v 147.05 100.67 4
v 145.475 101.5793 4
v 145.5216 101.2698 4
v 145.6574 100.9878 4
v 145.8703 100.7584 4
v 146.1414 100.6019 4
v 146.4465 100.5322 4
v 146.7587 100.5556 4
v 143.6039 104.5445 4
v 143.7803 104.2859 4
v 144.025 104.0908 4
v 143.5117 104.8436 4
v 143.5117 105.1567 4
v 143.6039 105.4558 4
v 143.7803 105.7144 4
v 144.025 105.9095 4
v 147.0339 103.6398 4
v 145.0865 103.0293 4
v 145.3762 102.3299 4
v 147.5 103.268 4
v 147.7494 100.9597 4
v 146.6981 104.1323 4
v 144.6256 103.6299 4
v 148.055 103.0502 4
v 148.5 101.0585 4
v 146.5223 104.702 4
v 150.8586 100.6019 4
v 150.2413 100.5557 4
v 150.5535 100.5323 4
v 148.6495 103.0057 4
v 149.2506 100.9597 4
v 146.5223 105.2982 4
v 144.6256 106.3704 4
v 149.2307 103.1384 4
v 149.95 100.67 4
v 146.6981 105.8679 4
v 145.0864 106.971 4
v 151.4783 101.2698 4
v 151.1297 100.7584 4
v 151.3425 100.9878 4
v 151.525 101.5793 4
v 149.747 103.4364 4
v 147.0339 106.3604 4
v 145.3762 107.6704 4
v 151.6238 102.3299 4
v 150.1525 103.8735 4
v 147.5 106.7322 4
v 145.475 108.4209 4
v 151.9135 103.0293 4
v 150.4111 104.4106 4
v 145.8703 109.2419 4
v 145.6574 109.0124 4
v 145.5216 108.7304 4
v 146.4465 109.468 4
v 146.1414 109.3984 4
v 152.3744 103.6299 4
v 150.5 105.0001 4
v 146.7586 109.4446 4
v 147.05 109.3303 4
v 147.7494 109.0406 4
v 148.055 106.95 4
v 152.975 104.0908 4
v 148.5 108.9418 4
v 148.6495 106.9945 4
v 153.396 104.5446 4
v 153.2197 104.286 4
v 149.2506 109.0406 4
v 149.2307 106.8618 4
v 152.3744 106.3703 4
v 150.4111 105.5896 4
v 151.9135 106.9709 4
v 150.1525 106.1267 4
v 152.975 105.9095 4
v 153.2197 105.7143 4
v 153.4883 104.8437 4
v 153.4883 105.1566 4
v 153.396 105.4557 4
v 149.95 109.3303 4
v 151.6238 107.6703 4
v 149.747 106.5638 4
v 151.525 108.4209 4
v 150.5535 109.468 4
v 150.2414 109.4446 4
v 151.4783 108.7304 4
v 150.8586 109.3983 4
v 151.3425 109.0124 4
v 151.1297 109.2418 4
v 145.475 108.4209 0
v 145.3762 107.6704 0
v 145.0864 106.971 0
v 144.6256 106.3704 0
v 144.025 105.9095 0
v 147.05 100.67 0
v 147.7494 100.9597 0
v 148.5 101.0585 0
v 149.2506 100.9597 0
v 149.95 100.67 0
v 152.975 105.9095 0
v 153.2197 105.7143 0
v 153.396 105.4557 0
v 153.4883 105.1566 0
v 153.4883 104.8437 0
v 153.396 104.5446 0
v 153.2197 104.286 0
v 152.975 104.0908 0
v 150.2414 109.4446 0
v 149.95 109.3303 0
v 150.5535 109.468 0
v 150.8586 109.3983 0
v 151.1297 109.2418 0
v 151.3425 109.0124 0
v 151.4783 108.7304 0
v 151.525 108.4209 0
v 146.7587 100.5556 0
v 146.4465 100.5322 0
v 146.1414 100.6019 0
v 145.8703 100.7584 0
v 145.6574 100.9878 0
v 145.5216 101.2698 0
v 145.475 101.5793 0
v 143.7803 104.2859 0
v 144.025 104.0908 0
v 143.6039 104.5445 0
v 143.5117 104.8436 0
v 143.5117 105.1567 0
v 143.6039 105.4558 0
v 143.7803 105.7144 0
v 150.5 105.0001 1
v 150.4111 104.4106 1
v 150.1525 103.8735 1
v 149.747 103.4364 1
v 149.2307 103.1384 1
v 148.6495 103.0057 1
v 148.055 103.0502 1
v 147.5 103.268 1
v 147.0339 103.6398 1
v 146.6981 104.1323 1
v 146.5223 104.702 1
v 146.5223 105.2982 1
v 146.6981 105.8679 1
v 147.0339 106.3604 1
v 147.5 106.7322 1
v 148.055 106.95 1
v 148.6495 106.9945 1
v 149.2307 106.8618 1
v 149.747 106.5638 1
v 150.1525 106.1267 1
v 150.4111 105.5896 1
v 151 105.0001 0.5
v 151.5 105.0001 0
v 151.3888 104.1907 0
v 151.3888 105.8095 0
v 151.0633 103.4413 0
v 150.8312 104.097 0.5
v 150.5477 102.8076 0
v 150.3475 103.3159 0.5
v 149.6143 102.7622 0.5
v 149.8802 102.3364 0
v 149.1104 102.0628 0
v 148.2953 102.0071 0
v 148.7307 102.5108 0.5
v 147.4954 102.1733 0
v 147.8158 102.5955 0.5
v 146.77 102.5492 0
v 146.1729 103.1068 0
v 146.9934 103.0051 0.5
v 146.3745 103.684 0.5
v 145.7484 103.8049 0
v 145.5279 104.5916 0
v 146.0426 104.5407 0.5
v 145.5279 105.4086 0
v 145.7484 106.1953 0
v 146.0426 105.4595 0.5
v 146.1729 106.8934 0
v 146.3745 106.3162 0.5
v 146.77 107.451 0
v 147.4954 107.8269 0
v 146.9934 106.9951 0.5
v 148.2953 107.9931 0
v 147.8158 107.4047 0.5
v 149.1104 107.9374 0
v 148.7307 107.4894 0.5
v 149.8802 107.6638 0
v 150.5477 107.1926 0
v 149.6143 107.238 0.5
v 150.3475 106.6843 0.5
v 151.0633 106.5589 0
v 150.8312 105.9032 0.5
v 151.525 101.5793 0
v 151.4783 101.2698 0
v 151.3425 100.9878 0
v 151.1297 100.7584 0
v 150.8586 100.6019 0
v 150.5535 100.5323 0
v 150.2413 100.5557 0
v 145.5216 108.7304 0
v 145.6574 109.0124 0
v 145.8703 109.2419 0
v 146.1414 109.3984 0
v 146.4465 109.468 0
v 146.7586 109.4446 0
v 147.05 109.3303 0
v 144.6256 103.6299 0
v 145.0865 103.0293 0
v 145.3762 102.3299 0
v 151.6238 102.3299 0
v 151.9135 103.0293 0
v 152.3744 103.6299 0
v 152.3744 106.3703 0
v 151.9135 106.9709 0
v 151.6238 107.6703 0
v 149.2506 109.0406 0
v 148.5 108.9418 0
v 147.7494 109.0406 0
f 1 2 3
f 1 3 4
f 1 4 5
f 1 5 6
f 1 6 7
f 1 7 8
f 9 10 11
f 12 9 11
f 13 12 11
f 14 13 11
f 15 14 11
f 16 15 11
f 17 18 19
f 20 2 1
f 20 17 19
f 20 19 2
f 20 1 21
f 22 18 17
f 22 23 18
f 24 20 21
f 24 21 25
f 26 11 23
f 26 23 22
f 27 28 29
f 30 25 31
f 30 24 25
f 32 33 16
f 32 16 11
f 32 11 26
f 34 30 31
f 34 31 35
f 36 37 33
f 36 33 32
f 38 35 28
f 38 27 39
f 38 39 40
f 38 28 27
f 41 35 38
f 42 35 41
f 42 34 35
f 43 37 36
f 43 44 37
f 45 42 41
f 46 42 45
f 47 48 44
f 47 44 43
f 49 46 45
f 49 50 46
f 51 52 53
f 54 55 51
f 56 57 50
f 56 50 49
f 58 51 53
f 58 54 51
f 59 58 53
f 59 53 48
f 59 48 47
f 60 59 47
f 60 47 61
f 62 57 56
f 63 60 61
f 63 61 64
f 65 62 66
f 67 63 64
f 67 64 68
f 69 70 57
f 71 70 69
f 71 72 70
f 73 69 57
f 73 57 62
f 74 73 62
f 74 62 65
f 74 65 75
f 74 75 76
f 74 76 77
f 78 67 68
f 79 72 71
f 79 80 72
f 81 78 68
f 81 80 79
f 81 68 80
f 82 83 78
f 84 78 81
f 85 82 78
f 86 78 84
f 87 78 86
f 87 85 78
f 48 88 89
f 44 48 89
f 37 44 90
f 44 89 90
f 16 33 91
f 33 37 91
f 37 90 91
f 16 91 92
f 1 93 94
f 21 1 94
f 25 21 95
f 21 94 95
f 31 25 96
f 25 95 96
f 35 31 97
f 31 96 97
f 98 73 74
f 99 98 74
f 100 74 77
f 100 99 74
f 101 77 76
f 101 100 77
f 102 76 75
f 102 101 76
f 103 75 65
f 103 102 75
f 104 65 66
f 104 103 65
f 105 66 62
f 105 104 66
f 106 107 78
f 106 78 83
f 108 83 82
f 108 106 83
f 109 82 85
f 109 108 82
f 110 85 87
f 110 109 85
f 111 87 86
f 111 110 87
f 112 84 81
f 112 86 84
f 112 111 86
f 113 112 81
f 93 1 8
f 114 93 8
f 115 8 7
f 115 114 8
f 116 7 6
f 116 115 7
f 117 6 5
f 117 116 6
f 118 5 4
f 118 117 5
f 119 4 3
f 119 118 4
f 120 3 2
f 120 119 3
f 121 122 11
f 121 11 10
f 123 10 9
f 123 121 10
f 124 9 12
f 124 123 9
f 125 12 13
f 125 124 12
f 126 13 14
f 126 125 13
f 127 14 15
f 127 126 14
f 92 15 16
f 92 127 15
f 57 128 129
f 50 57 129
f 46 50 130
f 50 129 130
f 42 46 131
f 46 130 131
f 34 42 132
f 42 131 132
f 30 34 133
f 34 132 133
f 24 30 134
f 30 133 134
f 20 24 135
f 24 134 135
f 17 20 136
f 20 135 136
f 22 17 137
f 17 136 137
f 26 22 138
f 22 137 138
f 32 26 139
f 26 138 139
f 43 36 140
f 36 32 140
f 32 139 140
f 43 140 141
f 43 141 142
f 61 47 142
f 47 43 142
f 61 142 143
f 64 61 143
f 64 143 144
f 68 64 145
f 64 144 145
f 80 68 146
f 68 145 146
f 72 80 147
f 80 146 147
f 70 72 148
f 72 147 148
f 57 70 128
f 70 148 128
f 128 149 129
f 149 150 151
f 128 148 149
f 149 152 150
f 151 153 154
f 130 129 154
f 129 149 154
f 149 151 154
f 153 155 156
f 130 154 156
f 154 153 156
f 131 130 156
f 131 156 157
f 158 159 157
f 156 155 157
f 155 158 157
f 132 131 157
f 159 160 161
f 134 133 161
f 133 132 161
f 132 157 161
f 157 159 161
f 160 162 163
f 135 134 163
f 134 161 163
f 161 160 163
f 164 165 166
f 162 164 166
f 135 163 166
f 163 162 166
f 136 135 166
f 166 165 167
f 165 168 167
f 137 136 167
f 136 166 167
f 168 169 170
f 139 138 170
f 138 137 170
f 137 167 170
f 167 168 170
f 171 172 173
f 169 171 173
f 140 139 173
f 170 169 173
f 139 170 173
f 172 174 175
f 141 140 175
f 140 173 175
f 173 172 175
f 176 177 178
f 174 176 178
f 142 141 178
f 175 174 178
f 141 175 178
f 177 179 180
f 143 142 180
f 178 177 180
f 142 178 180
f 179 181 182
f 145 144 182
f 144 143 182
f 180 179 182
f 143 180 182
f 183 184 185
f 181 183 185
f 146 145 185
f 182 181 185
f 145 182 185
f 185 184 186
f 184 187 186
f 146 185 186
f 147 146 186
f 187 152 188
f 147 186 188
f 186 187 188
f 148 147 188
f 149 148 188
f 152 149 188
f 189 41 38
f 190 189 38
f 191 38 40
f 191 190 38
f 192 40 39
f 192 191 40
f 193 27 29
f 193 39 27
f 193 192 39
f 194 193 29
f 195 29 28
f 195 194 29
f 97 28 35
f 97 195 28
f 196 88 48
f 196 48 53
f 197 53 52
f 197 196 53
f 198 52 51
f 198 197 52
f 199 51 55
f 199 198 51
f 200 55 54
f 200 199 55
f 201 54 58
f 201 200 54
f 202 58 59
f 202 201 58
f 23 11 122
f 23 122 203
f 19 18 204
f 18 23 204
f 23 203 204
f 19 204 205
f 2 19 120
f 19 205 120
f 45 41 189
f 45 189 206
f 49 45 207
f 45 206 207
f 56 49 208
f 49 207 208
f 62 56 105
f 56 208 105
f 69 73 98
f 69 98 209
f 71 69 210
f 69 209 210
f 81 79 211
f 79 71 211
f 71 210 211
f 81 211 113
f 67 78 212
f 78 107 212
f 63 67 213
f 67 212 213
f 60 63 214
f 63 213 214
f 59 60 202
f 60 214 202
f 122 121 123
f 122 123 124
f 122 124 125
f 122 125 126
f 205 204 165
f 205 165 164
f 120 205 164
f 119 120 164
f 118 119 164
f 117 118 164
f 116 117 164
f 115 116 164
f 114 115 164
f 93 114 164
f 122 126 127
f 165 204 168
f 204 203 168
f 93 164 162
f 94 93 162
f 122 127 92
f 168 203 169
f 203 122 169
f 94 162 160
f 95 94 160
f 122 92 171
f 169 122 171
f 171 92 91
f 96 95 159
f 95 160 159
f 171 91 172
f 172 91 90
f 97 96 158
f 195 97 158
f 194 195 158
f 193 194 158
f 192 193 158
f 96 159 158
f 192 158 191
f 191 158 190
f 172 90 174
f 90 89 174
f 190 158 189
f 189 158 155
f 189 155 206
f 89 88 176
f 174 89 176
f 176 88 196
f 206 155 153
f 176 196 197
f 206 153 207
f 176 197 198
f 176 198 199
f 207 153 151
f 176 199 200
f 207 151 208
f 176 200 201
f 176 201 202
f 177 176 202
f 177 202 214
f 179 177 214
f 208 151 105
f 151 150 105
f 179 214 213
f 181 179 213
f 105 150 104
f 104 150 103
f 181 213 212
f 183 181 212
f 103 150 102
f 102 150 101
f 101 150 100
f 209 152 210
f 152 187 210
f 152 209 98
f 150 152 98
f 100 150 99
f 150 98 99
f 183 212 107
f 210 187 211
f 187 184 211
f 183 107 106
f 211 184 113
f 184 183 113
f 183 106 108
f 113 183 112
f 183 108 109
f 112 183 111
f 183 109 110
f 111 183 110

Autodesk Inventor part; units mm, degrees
ref_plane "YZ Plane" through (0, 0, 0) normal (1, 0, 0) x (0, 1, 0)
ref_plane "XZ Plane" through (0, 0, 0) normal (0, 1, 0) x (-1, 0, 0)
ref_plane "XY Plane" through (0, 0, 0) normal (0, 0, 1) x (1, 0, 0)
sketch "スケッチ1" plane through (0, 0, 0) normal (0, 0, 1) x (1, 0, 0)
  arc A0 (144.025, 105.9095) -> (145.475, 108.4209) centre (142.575, 108.4209) ccw
  arc A1 (145.475, 101.5793) -> (144.025, 104.0908) centre (142.575, 101.5793) ccw
  line L0 (146, 100.67) -> (143.5, 105.0001) construction
  arc A2 (144.025, 105.9095) -> (144.025, 104.0908) centre (144.55, 105.0001) ccw
  line L1 (143.5, 105.0001) -> (146, 109.3303) construction
  circle A3 centre (148.5, 105.0001) radius 5 construction
  arc A4 (149.95, 100.67) -> (147.05, 100.67) centre (148.5, 98.1585) ccw
  line L2 (151, 100.67) -> (146, 100.67) construction
  arc A5 (145.475, 101.5793) -> (147.05, 100.67) centre (146.525, 101.5793) ccw
  arc A6 (149.95, 100.67) -> (151.525, 101.5793) centre (150.475, 101.5793) ccw
  arc A7 (152.975, 104.0908) -> (151.525, 101.5793) centre (154.425, 101.5793) ccw
  line L3 (153.5, 105.0001) -> (151, 100.67) construction
  arc A8 (152.975, 104.0908) -> (152.975, 105.9095) centre (152.45, 105.0001) ccw
  circle A9 centre (148.5, 105.0001) radius 2
  line L4 (151, 109.3303) -> (153.5, 105.0001) construction
  arc A10 (151.525, 108.4209) -> (152.975, 105.9095) centre (154.425, 108.4209) ccw
  arc A11 (151.525, 108.4209) -> (149.95, 109.3303) centre (150.475, 108.4209) ccw
  line L5 (146, 109.3303) -> (151, 109.3303) construction
  arc A12 (147.05, 109.3303) -> (149.95, 109.3303) centre (148.5, 111.8417) ccw
  arc A13 (147.05, 109.3303) -> (145.475, 108.4209) centre (146.525, 108.4209) ccw
  circle A14 centre (148.5, 105.0001) radius 6 construction
  point P0 (0, 0)
  point P1 (146, 100.67)
  point P2 (151, 100.67)
  point P3 (153.5, 105.0001)
  point P4 (145.475, 101.5793)
  point P5 (151.525, 101.5793)
  point P6 (152.975, 104.0908)
  point P7 (152.975, 105.9095)
  point P8 (151.525, 108.4209)
  point P9 (145.475, 108.4209)
  point P10 (144.025, 105.9095)
  point P11 (144.025, 104.0908)
  dimension "d4" = 10
  dimension "d5" = 360
  dimension "d6" = 360
  dimension "d7" = 1.05
  dimension "d8" = 4
  dimension "d9" = 12
extrude "押し出し1" add sketch "スケッチ1" along normal blind 4
chamfer "面取り1" distance 1 angle 45 1 edges at (146.5, 105.0001, 0)
properties part number "3ギア接続部3" material "アルミニウム 2014-T4"
